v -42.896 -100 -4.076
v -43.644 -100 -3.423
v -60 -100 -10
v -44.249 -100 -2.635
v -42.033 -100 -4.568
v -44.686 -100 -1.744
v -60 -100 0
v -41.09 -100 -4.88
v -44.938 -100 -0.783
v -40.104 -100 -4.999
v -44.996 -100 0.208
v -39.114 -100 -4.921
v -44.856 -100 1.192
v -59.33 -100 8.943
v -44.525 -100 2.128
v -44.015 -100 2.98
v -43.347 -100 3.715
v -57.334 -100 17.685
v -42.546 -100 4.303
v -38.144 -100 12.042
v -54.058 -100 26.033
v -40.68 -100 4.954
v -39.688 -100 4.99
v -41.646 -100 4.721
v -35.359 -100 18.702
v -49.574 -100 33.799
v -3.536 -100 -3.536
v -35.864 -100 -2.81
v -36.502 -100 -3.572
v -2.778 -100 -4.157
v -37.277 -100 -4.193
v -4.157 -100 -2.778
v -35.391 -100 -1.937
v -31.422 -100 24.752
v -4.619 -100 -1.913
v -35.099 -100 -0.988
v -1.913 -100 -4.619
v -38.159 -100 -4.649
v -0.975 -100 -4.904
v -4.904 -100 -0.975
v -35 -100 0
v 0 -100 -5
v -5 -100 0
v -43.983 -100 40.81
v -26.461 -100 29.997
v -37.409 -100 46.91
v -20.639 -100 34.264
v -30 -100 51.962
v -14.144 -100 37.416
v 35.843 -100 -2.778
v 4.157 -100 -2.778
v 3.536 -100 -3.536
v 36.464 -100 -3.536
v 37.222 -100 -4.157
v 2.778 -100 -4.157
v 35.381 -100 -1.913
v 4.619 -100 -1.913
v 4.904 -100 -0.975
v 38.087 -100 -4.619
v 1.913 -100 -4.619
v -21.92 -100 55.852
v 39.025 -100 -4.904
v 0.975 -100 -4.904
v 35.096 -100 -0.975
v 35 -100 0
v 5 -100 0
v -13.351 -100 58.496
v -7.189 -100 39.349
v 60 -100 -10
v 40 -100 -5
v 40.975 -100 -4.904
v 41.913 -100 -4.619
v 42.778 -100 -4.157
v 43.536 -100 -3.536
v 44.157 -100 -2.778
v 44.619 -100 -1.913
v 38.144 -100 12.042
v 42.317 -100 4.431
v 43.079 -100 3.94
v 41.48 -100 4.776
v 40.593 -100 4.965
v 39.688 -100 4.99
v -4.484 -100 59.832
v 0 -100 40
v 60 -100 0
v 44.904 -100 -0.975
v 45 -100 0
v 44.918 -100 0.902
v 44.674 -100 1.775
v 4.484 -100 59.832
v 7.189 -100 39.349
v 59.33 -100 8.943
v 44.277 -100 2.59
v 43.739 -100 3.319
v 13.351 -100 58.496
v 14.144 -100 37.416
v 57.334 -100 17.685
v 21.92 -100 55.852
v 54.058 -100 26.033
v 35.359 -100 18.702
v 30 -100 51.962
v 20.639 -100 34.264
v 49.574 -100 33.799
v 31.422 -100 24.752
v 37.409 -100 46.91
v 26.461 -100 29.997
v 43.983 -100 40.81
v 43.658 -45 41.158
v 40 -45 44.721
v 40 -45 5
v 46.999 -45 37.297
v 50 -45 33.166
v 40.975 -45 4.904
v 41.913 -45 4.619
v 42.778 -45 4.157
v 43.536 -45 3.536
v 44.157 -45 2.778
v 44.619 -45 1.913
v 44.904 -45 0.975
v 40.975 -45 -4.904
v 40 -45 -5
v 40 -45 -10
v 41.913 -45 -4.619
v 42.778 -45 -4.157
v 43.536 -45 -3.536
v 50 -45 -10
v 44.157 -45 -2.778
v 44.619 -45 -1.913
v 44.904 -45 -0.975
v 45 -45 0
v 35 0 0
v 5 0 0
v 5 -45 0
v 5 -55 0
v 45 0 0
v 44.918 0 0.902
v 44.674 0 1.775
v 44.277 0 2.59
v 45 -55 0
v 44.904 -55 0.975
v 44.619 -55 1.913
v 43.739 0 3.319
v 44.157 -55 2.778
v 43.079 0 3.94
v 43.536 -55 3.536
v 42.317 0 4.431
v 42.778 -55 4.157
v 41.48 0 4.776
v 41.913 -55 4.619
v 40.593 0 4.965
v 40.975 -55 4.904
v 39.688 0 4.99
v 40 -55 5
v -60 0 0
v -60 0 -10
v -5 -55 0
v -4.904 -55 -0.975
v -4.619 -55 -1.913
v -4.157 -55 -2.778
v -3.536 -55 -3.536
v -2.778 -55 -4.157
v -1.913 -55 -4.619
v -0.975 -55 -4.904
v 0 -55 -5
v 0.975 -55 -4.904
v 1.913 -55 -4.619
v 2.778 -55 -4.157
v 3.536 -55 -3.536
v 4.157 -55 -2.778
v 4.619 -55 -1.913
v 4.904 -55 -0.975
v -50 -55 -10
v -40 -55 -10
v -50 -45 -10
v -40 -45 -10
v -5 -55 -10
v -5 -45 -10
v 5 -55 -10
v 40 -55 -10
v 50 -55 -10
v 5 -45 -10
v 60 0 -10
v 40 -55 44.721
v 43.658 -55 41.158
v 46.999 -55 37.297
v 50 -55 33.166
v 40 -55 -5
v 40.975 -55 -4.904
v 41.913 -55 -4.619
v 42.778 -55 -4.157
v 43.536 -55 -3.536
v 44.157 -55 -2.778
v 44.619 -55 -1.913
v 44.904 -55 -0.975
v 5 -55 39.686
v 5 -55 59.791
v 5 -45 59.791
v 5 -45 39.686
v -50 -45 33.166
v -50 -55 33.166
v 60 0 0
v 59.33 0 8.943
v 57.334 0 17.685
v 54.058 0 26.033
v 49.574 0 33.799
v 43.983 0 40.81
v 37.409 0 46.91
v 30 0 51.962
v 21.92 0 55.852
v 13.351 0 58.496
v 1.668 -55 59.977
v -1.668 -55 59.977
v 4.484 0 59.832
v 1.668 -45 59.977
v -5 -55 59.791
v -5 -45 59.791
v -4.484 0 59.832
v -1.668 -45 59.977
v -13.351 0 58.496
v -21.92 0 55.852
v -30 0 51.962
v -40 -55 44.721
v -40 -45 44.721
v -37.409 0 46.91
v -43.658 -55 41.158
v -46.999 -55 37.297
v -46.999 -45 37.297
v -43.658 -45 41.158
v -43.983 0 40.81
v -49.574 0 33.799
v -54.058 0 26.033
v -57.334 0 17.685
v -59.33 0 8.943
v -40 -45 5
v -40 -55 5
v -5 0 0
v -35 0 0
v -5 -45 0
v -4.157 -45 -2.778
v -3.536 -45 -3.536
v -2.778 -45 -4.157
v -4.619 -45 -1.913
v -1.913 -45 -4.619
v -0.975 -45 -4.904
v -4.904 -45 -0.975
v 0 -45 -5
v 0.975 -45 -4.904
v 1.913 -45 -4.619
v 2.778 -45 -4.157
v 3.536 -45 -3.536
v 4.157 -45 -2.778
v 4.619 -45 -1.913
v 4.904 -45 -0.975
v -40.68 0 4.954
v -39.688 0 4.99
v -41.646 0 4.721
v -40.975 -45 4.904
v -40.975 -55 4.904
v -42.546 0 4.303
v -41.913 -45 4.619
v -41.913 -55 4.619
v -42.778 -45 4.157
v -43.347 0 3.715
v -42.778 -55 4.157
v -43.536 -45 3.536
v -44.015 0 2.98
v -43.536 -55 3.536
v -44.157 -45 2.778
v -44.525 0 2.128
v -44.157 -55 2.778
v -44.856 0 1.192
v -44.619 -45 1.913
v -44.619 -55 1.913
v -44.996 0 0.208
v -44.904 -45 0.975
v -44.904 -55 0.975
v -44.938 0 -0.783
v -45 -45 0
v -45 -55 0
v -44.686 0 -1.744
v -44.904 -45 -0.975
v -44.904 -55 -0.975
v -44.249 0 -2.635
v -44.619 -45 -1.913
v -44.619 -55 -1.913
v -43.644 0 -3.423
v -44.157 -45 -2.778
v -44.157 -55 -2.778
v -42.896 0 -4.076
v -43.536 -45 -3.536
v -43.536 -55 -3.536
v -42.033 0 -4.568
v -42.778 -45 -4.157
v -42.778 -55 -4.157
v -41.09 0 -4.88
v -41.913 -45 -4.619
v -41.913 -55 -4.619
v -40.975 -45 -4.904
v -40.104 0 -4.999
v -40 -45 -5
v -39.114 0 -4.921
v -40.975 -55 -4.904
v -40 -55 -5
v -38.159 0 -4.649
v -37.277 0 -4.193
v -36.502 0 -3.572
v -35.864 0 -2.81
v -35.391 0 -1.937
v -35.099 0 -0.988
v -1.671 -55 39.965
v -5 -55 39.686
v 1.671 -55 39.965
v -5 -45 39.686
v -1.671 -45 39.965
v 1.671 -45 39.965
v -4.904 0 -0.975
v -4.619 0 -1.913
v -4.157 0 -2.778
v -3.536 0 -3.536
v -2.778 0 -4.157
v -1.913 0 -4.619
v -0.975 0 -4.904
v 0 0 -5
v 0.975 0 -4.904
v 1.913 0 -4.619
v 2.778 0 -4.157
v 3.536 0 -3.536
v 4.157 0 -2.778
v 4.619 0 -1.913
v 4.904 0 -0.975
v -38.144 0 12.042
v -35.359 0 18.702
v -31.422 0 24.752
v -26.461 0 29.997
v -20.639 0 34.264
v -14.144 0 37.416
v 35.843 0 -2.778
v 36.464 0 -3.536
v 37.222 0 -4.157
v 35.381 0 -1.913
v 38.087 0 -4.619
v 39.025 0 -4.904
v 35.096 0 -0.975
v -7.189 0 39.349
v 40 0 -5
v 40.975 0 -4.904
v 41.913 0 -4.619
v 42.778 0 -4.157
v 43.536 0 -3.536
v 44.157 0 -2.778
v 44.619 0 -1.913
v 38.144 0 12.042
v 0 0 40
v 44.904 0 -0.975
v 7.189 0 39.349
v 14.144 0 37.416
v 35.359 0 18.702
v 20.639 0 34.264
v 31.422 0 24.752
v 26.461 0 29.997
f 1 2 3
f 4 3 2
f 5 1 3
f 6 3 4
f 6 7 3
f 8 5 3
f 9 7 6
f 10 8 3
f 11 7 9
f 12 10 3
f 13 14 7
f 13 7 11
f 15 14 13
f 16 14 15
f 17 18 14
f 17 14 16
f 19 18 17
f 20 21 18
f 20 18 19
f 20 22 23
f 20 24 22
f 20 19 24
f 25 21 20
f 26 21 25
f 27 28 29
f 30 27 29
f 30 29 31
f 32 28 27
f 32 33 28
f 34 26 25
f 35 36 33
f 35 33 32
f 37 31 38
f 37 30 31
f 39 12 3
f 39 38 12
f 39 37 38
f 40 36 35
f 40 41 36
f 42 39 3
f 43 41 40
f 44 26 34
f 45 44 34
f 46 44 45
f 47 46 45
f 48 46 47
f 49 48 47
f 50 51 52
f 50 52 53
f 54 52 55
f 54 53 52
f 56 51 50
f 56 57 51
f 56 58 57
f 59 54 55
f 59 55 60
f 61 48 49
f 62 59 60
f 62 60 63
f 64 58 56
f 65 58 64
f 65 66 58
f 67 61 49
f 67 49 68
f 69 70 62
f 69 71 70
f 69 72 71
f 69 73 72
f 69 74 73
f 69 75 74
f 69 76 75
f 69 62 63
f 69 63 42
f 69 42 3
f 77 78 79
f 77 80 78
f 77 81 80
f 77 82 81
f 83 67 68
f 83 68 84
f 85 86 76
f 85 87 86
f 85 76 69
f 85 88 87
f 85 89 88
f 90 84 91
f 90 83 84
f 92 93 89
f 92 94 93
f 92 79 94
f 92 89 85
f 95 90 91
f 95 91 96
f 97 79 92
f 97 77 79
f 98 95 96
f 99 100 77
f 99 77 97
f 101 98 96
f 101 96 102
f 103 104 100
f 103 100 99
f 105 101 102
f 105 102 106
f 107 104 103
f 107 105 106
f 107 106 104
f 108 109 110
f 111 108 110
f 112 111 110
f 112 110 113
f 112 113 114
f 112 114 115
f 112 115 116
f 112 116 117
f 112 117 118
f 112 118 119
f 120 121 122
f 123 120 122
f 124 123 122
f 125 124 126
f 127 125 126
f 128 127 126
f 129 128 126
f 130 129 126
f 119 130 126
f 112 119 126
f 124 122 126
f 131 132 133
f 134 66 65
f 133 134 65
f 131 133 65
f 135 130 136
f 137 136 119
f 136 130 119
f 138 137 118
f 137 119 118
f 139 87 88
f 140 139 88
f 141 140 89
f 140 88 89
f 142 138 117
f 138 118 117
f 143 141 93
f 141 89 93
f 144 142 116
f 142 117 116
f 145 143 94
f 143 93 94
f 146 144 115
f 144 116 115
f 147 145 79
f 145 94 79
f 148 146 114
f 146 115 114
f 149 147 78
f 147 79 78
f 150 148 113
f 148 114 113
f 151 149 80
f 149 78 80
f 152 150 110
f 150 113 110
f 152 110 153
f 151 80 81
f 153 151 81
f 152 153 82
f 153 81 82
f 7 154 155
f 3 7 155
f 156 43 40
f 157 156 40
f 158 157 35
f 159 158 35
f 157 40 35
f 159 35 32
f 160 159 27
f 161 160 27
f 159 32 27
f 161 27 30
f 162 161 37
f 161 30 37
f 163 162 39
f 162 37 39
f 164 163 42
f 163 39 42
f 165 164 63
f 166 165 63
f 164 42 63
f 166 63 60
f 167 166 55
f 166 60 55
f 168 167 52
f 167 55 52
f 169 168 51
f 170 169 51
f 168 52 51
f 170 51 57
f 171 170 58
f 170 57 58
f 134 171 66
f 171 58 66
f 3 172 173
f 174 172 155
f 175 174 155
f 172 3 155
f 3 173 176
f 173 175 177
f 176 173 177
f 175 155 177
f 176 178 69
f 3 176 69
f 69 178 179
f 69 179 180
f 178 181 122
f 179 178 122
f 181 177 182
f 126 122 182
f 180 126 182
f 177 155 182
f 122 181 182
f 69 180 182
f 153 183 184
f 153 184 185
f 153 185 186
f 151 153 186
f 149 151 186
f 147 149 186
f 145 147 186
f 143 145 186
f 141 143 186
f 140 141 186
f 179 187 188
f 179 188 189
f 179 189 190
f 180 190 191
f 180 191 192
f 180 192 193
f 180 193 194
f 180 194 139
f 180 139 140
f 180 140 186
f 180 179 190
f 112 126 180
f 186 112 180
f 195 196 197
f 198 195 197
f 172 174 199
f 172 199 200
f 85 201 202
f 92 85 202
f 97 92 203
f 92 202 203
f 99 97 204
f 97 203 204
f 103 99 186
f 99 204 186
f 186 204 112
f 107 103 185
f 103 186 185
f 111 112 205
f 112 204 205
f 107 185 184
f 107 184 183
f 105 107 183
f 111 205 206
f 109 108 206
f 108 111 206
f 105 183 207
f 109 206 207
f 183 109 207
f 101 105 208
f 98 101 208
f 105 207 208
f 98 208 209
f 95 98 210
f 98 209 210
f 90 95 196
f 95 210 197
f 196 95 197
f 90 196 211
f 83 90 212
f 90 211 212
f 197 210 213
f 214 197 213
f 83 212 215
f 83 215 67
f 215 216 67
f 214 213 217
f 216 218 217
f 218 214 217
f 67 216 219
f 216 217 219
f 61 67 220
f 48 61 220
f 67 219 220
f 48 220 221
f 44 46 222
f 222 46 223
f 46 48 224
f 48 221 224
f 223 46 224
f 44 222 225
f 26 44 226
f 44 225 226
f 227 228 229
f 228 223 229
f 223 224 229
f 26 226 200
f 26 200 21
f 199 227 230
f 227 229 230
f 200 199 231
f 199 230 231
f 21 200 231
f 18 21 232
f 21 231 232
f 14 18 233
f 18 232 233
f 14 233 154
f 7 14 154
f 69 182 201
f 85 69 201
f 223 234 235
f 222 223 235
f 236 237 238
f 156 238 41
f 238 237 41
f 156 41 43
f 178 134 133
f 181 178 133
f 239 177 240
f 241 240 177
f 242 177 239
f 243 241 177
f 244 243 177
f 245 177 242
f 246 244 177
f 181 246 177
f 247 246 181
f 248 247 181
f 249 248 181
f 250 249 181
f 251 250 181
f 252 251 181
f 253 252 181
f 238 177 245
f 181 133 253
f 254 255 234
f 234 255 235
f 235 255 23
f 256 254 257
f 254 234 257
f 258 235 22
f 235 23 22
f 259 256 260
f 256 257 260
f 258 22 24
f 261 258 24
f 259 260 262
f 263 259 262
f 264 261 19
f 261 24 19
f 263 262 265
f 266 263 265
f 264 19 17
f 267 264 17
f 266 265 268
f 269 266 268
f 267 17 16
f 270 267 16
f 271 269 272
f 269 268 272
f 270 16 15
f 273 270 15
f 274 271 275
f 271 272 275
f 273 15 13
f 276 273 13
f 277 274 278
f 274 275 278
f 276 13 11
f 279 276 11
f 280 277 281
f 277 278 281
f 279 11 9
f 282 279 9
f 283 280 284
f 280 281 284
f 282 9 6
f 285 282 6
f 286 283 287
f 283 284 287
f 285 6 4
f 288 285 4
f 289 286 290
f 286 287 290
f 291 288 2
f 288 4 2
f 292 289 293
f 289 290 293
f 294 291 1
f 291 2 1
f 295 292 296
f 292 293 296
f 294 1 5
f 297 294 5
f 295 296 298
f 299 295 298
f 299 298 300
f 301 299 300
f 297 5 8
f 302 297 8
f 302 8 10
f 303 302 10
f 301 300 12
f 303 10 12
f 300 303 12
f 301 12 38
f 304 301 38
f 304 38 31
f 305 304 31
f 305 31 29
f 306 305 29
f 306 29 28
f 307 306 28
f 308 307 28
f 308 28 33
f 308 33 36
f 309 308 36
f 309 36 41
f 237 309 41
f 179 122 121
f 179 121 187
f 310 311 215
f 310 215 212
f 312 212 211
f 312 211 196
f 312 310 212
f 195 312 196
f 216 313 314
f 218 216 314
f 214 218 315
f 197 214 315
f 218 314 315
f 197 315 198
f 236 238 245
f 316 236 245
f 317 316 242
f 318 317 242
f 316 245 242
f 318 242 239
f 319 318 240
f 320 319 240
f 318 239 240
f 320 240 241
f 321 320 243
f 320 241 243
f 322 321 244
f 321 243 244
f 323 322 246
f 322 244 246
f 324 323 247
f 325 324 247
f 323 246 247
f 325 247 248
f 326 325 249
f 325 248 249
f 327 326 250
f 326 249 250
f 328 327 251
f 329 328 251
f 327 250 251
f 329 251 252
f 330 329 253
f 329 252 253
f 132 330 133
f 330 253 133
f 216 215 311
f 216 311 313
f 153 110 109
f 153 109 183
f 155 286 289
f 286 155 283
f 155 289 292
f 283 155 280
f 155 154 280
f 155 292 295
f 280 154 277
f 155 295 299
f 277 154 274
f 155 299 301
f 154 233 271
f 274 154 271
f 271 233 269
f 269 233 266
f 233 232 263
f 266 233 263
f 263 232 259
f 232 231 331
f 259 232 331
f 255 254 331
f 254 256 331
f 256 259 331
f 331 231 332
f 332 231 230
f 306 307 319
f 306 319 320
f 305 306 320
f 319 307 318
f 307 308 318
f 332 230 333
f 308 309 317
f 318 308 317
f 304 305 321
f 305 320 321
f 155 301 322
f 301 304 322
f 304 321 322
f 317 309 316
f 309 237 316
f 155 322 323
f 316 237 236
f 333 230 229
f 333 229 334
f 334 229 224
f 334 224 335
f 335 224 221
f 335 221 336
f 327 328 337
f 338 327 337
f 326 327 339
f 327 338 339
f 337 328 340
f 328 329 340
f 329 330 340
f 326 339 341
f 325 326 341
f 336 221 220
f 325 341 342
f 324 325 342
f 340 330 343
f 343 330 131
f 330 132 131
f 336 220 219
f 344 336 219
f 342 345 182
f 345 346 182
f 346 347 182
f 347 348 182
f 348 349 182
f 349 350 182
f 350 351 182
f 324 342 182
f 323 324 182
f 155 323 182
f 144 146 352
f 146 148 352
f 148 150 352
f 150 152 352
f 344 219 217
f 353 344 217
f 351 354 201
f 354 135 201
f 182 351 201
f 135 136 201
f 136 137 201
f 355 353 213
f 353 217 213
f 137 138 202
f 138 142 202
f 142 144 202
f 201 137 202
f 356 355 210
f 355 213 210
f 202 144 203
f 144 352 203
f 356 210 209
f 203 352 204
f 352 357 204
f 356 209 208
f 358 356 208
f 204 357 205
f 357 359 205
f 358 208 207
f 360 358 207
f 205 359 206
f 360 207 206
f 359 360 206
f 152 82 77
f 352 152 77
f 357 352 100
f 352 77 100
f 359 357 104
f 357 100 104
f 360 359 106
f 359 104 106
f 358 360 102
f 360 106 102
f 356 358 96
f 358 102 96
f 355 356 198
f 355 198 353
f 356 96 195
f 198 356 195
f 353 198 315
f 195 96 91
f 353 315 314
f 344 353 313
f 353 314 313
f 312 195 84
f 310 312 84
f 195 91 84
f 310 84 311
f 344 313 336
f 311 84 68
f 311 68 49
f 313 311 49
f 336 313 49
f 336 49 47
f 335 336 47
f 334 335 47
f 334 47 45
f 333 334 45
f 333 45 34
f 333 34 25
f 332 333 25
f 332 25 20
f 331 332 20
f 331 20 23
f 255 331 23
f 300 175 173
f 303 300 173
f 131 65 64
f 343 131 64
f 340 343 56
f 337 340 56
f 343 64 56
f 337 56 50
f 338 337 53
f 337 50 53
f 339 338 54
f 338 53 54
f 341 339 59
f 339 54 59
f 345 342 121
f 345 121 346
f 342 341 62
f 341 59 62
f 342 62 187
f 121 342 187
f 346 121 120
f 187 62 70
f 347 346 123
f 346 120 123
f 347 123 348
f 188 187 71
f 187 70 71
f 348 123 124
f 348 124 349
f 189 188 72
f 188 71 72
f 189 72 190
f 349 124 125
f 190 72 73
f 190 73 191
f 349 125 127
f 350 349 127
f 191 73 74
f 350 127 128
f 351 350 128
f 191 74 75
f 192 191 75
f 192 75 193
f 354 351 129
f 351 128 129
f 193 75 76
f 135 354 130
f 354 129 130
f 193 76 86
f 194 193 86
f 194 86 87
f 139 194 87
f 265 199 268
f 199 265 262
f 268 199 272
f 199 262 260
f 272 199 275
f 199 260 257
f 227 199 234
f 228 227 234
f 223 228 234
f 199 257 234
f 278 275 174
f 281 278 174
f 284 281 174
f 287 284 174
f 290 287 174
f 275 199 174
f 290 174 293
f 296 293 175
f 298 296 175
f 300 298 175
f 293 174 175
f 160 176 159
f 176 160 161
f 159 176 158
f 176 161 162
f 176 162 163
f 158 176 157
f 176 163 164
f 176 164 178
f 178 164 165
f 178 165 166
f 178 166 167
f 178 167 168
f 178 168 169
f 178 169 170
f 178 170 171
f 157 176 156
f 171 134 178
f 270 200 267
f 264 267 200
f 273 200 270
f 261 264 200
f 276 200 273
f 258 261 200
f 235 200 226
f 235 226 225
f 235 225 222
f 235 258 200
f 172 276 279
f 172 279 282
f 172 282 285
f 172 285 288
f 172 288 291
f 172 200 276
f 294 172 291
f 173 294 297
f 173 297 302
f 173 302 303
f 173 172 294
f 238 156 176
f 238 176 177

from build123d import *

# Parameters (mm, degrees)
F1_DEPTH  = 100
F3_DEPTH  = 100.001
F4_W      = 10
F4_H      = 10
F5_DEPTH  = 10.001
F6_DEPTH  = 60.001
F7_W      = 10
F7_H      = 10
F8_DEPTH  = 70.001
F9_W      = 10
F9_H      = 10
F10_DEPTH = 70.001


with BuildPart() as f1:
    # F0 (on Front) → F1 (new body)
    with BuildSketch(Plane.XZ):
        with BuildLine():
            Line((60, -10), (60, 0))
            ThreePointArc((60, 0), (0, 60), (-60, 0))
            Line((-60, 0), (-60, -10))
            Line((-60, -10), (60, -10))
        make_face()
    extrude(amount=F1_DEPTH)

    # F2 (on face) → F3 (cut, through all)
    with BuildSketch(Plane.XZ.offset(100)):
        with BuildLine():
            Line((35, 0), (40, 0))
            ThreePointArc((40, 0), (39.9217985567, 2.5), (39.6875, 4.9902248196))
            ThreePointArc((39.6875, 4.9902248196), (36.3556550657, 3.4232659844), (35, 0))
        make_face()
        with BuildLine():
            ThreePointArc((39.6875, 4.9902248196), (39.9217985567, 2.5), (40, 0))
            Line((40, 0), (35, 0))
            ThreePointArc((35, 0), (40, -5), (45, 0))
            ThreePointArc((45, 0), (43.4232659844, 3.6443449343), (39.6875, 4.9902248196))
        make_face()
        with BuildLine():
            ThreePointArc((35, 0), (36.3556550657, 3.4232659844), (39.6875, 4.9902248196))
            ThreePointArc((39.6875, 4.9902248196), (0, 40), (-39.6875, 4.9902248196))
            ThreePointArc((-39.6875, 4.9902248196), (-36.3556550657, 3.4232659844), (-35, 0))
            Line((-35, 0), (-5, 0))
            ThreePointArc((-5, 0), (0, 5), (5, 0))
            Line((5, 0), (35, 0))
        make_face()
        with BuildLine():
            ThreePointArc((-35, 0), (-36.3556550657, 3.4232659844), (-39.6875, 4.9902248196))
            ThreePointArc((-39.6875, 4.9902248196), (-39.9217985567, 2.5), (-40, 0))
            Line((-40, 0), (-35, 0))
        make_face()
        with BuildLine():
            ThreePointArc((-40, 0), (-39.9217985567, 2.5), (-39.6875, 4.9902248196))
            ThreePointArc((-39.6875, 4.9902248196), (-43.6443449343, -3.4232659844), (-35, 0))
            Line((-35, 0), (-40, 0))
        make_face()
        with BuildLine():
            ThreePointArc((-5, 0), (0, -5), (5, 0))
            Line((5, 0), (-5, 0))
        make_face()
        with BuildLine():
            Line((-5, 0), (5, 0))
            ThreePointArc((5, 0), (0, 5), (-5, 0))
        make_face()
    extrude(amount=-F3_DEPTH, mode=Mode.SUBTRACT)

    # F4 (on Top) → F5 (cut, through all)
    with BuildSketch(Plane.XY):
        with Locations((0, -50)):
            Rectangle(F4_W, F4_H)
    extrude(amount=-F5_DEPTH, mode=Mode.SUBTRACT)

    # F4 (on Top) → F6 (cut, through all)
    with BuildSketch(Plane.XY):
        with Locations((0, -50)):
            Rectangle(F4_W, F4_H)
    extrude(amount=F6_DEPTH, mode=Mode.SUBTRACT)

    # F7 (on face) → F8 (cut, through all)
    with BuildSketch(Plane(origin=(0, 0, -10), x_dir=(1, 0, 0), z_dir=(0, 0, -1))):
        with Locations((45, 50)):
            Rectangle(F7_W, F7_H)
    extrude(amount=-F8_DEPTH, mode=Mode.SUBTRACT)

    # F9 (on face) → F10 (cut, through all)
    with BuildSketch(Plane(origin=(0, 0, -10), x_dir=(1, 0, 0), z_dir=(0, 0, -1))):
        with Locations((-45, 50)):
            Rectangle(F9_W, F9_H)
    extrude(amount=-F10_DEPTH, mode=Mode.SUBTRACT)


solid = f1.part
